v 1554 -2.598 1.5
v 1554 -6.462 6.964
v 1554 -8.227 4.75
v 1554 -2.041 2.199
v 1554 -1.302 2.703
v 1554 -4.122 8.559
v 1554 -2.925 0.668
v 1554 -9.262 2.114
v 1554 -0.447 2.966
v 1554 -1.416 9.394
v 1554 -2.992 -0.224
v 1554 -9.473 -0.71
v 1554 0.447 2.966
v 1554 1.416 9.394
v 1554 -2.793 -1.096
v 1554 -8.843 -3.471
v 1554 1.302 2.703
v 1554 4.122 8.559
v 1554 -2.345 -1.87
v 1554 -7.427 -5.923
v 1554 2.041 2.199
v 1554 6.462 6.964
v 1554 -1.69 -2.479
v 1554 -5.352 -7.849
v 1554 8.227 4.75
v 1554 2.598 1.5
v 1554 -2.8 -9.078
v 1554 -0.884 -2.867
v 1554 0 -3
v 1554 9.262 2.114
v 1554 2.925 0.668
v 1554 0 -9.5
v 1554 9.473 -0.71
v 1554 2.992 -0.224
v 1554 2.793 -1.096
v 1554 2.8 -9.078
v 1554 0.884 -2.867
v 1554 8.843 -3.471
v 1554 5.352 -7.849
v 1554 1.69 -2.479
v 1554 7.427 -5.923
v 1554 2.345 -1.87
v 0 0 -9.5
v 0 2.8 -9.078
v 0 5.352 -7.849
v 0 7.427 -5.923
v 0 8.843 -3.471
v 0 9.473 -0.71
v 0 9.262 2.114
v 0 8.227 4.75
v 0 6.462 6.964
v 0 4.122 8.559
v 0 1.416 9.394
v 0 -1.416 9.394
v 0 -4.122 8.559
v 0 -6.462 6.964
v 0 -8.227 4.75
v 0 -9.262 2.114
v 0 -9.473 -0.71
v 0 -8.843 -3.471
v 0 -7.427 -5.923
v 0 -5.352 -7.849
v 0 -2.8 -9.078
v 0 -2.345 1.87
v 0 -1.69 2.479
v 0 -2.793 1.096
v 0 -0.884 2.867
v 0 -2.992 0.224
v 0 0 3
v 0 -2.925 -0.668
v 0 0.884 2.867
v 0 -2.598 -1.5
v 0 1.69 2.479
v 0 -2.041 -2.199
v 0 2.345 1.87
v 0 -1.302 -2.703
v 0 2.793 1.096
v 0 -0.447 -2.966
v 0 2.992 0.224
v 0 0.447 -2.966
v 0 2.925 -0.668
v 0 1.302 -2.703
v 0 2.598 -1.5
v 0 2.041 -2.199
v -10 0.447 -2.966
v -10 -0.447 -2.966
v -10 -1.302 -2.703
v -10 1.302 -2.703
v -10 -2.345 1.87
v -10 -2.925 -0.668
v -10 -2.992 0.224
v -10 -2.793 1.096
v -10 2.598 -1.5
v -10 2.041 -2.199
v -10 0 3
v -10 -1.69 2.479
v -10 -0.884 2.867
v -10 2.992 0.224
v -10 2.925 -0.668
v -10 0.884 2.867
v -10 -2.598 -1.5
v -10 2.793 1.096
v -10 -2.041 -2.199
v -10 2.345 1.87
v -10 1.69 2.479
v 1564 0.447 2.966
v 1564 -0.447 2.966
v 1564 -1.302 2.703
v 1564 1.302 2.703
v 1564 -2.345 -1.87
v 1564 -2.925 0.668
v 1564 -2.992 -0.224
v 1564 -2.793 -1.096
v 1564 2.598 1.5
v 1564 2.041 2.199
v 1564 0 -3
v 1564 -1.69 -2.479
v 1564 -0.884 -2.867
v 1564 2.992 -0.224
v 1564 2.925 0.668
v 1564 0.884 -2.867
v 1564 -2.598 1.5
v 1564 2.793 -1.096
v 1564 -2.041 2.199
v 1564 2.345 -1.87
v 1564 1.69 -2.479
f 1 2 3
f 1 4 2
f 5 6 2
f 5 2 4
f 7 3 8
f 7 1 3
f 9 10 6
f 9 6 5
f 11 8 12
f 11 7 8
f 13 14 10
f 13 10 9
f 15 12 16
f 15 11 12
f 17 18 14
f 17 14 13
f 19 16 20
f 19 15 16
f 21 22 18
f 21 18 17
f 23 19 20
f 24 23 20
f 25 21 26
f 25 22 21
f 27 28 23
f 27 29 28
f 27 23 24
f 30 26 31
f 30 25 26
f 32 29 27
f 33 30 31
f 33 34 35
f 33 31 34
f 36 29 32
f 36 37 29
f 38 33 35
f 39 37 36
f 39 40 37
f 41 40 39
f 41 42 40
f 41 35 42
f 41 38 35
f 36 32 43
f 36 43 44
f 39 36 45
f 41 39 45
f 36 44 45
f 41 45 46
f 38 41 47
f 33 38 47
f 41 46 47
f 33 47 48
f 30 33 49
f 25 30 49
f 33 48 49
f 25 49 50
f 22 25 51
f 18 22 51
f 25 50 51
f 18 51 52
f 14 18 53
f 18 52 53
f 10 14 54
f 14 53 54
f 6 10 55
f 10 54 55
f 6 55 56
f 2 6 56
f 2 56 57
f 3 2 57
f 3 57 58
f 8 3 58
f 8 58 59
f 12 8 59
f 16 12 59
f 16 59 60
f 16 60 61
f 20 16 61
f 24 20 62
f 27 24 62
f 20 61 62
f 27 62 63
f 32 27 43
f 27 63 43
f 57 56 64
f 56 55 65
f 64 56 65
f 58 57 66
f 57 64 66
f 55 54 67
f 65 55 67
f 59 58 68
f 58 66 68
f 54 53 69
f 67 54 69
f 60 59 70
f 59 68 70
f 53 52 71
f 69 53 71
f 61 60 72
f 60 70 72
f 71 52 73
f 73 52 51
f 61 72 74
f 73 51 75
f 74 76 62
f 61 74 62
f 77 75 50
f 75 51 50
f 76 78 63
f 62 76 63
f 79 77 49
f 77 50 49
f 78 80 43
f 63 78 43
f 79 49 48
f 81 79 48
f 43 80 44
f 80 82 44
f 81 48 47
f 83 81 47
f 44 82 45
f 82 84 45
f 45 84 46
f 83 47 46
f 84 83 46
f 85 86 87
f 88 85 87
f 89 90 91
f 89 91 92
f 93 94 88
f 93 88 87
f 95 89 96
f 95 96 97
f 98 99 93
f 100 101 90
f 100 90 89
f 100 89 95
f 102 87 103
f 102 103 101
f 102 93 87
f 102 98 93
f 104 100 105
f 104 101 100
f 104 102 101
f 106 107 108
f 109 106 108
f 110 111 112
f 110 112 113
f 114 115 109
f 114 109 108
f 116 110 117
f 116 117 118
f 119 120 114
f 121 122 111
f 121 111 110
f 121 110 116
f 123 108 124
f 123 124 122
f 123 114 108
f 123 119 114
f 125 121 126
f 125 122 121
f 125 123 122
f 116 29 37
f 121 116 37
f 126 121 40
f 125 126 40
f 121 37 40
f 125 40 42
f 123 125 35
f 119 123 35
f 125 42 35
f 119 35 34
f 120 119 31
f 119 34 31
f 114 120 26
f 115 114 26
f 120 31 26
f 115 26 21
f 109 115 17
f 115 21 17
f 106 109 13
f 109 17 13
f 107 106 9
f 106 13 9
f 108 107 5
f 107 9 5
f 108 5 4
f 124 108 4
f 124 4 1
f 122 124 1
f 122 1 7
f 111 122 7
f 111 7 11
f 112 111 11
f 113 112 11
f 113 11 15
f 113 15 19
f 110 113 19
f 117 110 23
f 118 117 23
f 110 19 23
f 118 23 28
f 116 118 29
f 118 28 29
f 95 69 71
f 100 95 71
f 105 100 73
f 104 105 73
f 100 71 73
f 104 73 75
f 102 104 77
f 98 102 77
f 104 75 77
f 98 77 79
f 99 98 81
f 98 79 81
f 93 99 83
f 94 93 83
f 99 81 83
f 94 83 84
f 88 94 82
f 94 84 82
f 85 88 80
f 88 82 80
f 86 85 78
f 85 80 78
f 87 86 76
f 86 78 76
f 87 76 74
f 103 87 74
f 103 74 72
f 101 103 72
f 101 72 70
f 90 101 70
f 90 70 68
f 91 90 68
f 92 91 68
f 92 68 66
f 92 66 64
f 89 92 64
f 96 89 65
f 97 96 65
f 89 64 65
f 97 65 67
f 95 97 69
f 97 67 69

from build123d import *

# Parameters (mm, degrees)
SKETCH1_R           = 9.5
BOSS_EXTRUDE1_DEPTH = 1554
SKETCH2_R           = 3
BOSS_EXTRUDE2_DEPTH = 10
SKETCH3_R           = 3
BOSS_EXTRUDE3_DEPTH = 10


with BuildPart() as part:
    # Sketch1 → Boss-Extrude1 (new body)
    with BuildSketch(Plane(origin=(0, 0, 0), x_dir=(0, 0, -1), z_dir=(1, 0, 0))):
        Circle(SKETCH1_R)
    extrude(amount=BOSS_EXTRUDE1_DEPTH)

    # Sketch2 → Boss-Extrude2 (add)
    with BuildSketch(Plane.ZY):
        Circle(SKETCH2_R)
    extrude(amount=BOSS_EXTRUDE2_DEPTH)

    # Sketch3 → Boss-Extrude3 (add)
    with BuildSketch(Plane(origin=(1554, 0, 0), x_dir=(0, 0, -1), z_dir=(1, 0, 0))):
        Circle(SKETCH3_R)
    extrude(amount=BOSS_EXTRUDE3_DEPTH)


solid = part.part
